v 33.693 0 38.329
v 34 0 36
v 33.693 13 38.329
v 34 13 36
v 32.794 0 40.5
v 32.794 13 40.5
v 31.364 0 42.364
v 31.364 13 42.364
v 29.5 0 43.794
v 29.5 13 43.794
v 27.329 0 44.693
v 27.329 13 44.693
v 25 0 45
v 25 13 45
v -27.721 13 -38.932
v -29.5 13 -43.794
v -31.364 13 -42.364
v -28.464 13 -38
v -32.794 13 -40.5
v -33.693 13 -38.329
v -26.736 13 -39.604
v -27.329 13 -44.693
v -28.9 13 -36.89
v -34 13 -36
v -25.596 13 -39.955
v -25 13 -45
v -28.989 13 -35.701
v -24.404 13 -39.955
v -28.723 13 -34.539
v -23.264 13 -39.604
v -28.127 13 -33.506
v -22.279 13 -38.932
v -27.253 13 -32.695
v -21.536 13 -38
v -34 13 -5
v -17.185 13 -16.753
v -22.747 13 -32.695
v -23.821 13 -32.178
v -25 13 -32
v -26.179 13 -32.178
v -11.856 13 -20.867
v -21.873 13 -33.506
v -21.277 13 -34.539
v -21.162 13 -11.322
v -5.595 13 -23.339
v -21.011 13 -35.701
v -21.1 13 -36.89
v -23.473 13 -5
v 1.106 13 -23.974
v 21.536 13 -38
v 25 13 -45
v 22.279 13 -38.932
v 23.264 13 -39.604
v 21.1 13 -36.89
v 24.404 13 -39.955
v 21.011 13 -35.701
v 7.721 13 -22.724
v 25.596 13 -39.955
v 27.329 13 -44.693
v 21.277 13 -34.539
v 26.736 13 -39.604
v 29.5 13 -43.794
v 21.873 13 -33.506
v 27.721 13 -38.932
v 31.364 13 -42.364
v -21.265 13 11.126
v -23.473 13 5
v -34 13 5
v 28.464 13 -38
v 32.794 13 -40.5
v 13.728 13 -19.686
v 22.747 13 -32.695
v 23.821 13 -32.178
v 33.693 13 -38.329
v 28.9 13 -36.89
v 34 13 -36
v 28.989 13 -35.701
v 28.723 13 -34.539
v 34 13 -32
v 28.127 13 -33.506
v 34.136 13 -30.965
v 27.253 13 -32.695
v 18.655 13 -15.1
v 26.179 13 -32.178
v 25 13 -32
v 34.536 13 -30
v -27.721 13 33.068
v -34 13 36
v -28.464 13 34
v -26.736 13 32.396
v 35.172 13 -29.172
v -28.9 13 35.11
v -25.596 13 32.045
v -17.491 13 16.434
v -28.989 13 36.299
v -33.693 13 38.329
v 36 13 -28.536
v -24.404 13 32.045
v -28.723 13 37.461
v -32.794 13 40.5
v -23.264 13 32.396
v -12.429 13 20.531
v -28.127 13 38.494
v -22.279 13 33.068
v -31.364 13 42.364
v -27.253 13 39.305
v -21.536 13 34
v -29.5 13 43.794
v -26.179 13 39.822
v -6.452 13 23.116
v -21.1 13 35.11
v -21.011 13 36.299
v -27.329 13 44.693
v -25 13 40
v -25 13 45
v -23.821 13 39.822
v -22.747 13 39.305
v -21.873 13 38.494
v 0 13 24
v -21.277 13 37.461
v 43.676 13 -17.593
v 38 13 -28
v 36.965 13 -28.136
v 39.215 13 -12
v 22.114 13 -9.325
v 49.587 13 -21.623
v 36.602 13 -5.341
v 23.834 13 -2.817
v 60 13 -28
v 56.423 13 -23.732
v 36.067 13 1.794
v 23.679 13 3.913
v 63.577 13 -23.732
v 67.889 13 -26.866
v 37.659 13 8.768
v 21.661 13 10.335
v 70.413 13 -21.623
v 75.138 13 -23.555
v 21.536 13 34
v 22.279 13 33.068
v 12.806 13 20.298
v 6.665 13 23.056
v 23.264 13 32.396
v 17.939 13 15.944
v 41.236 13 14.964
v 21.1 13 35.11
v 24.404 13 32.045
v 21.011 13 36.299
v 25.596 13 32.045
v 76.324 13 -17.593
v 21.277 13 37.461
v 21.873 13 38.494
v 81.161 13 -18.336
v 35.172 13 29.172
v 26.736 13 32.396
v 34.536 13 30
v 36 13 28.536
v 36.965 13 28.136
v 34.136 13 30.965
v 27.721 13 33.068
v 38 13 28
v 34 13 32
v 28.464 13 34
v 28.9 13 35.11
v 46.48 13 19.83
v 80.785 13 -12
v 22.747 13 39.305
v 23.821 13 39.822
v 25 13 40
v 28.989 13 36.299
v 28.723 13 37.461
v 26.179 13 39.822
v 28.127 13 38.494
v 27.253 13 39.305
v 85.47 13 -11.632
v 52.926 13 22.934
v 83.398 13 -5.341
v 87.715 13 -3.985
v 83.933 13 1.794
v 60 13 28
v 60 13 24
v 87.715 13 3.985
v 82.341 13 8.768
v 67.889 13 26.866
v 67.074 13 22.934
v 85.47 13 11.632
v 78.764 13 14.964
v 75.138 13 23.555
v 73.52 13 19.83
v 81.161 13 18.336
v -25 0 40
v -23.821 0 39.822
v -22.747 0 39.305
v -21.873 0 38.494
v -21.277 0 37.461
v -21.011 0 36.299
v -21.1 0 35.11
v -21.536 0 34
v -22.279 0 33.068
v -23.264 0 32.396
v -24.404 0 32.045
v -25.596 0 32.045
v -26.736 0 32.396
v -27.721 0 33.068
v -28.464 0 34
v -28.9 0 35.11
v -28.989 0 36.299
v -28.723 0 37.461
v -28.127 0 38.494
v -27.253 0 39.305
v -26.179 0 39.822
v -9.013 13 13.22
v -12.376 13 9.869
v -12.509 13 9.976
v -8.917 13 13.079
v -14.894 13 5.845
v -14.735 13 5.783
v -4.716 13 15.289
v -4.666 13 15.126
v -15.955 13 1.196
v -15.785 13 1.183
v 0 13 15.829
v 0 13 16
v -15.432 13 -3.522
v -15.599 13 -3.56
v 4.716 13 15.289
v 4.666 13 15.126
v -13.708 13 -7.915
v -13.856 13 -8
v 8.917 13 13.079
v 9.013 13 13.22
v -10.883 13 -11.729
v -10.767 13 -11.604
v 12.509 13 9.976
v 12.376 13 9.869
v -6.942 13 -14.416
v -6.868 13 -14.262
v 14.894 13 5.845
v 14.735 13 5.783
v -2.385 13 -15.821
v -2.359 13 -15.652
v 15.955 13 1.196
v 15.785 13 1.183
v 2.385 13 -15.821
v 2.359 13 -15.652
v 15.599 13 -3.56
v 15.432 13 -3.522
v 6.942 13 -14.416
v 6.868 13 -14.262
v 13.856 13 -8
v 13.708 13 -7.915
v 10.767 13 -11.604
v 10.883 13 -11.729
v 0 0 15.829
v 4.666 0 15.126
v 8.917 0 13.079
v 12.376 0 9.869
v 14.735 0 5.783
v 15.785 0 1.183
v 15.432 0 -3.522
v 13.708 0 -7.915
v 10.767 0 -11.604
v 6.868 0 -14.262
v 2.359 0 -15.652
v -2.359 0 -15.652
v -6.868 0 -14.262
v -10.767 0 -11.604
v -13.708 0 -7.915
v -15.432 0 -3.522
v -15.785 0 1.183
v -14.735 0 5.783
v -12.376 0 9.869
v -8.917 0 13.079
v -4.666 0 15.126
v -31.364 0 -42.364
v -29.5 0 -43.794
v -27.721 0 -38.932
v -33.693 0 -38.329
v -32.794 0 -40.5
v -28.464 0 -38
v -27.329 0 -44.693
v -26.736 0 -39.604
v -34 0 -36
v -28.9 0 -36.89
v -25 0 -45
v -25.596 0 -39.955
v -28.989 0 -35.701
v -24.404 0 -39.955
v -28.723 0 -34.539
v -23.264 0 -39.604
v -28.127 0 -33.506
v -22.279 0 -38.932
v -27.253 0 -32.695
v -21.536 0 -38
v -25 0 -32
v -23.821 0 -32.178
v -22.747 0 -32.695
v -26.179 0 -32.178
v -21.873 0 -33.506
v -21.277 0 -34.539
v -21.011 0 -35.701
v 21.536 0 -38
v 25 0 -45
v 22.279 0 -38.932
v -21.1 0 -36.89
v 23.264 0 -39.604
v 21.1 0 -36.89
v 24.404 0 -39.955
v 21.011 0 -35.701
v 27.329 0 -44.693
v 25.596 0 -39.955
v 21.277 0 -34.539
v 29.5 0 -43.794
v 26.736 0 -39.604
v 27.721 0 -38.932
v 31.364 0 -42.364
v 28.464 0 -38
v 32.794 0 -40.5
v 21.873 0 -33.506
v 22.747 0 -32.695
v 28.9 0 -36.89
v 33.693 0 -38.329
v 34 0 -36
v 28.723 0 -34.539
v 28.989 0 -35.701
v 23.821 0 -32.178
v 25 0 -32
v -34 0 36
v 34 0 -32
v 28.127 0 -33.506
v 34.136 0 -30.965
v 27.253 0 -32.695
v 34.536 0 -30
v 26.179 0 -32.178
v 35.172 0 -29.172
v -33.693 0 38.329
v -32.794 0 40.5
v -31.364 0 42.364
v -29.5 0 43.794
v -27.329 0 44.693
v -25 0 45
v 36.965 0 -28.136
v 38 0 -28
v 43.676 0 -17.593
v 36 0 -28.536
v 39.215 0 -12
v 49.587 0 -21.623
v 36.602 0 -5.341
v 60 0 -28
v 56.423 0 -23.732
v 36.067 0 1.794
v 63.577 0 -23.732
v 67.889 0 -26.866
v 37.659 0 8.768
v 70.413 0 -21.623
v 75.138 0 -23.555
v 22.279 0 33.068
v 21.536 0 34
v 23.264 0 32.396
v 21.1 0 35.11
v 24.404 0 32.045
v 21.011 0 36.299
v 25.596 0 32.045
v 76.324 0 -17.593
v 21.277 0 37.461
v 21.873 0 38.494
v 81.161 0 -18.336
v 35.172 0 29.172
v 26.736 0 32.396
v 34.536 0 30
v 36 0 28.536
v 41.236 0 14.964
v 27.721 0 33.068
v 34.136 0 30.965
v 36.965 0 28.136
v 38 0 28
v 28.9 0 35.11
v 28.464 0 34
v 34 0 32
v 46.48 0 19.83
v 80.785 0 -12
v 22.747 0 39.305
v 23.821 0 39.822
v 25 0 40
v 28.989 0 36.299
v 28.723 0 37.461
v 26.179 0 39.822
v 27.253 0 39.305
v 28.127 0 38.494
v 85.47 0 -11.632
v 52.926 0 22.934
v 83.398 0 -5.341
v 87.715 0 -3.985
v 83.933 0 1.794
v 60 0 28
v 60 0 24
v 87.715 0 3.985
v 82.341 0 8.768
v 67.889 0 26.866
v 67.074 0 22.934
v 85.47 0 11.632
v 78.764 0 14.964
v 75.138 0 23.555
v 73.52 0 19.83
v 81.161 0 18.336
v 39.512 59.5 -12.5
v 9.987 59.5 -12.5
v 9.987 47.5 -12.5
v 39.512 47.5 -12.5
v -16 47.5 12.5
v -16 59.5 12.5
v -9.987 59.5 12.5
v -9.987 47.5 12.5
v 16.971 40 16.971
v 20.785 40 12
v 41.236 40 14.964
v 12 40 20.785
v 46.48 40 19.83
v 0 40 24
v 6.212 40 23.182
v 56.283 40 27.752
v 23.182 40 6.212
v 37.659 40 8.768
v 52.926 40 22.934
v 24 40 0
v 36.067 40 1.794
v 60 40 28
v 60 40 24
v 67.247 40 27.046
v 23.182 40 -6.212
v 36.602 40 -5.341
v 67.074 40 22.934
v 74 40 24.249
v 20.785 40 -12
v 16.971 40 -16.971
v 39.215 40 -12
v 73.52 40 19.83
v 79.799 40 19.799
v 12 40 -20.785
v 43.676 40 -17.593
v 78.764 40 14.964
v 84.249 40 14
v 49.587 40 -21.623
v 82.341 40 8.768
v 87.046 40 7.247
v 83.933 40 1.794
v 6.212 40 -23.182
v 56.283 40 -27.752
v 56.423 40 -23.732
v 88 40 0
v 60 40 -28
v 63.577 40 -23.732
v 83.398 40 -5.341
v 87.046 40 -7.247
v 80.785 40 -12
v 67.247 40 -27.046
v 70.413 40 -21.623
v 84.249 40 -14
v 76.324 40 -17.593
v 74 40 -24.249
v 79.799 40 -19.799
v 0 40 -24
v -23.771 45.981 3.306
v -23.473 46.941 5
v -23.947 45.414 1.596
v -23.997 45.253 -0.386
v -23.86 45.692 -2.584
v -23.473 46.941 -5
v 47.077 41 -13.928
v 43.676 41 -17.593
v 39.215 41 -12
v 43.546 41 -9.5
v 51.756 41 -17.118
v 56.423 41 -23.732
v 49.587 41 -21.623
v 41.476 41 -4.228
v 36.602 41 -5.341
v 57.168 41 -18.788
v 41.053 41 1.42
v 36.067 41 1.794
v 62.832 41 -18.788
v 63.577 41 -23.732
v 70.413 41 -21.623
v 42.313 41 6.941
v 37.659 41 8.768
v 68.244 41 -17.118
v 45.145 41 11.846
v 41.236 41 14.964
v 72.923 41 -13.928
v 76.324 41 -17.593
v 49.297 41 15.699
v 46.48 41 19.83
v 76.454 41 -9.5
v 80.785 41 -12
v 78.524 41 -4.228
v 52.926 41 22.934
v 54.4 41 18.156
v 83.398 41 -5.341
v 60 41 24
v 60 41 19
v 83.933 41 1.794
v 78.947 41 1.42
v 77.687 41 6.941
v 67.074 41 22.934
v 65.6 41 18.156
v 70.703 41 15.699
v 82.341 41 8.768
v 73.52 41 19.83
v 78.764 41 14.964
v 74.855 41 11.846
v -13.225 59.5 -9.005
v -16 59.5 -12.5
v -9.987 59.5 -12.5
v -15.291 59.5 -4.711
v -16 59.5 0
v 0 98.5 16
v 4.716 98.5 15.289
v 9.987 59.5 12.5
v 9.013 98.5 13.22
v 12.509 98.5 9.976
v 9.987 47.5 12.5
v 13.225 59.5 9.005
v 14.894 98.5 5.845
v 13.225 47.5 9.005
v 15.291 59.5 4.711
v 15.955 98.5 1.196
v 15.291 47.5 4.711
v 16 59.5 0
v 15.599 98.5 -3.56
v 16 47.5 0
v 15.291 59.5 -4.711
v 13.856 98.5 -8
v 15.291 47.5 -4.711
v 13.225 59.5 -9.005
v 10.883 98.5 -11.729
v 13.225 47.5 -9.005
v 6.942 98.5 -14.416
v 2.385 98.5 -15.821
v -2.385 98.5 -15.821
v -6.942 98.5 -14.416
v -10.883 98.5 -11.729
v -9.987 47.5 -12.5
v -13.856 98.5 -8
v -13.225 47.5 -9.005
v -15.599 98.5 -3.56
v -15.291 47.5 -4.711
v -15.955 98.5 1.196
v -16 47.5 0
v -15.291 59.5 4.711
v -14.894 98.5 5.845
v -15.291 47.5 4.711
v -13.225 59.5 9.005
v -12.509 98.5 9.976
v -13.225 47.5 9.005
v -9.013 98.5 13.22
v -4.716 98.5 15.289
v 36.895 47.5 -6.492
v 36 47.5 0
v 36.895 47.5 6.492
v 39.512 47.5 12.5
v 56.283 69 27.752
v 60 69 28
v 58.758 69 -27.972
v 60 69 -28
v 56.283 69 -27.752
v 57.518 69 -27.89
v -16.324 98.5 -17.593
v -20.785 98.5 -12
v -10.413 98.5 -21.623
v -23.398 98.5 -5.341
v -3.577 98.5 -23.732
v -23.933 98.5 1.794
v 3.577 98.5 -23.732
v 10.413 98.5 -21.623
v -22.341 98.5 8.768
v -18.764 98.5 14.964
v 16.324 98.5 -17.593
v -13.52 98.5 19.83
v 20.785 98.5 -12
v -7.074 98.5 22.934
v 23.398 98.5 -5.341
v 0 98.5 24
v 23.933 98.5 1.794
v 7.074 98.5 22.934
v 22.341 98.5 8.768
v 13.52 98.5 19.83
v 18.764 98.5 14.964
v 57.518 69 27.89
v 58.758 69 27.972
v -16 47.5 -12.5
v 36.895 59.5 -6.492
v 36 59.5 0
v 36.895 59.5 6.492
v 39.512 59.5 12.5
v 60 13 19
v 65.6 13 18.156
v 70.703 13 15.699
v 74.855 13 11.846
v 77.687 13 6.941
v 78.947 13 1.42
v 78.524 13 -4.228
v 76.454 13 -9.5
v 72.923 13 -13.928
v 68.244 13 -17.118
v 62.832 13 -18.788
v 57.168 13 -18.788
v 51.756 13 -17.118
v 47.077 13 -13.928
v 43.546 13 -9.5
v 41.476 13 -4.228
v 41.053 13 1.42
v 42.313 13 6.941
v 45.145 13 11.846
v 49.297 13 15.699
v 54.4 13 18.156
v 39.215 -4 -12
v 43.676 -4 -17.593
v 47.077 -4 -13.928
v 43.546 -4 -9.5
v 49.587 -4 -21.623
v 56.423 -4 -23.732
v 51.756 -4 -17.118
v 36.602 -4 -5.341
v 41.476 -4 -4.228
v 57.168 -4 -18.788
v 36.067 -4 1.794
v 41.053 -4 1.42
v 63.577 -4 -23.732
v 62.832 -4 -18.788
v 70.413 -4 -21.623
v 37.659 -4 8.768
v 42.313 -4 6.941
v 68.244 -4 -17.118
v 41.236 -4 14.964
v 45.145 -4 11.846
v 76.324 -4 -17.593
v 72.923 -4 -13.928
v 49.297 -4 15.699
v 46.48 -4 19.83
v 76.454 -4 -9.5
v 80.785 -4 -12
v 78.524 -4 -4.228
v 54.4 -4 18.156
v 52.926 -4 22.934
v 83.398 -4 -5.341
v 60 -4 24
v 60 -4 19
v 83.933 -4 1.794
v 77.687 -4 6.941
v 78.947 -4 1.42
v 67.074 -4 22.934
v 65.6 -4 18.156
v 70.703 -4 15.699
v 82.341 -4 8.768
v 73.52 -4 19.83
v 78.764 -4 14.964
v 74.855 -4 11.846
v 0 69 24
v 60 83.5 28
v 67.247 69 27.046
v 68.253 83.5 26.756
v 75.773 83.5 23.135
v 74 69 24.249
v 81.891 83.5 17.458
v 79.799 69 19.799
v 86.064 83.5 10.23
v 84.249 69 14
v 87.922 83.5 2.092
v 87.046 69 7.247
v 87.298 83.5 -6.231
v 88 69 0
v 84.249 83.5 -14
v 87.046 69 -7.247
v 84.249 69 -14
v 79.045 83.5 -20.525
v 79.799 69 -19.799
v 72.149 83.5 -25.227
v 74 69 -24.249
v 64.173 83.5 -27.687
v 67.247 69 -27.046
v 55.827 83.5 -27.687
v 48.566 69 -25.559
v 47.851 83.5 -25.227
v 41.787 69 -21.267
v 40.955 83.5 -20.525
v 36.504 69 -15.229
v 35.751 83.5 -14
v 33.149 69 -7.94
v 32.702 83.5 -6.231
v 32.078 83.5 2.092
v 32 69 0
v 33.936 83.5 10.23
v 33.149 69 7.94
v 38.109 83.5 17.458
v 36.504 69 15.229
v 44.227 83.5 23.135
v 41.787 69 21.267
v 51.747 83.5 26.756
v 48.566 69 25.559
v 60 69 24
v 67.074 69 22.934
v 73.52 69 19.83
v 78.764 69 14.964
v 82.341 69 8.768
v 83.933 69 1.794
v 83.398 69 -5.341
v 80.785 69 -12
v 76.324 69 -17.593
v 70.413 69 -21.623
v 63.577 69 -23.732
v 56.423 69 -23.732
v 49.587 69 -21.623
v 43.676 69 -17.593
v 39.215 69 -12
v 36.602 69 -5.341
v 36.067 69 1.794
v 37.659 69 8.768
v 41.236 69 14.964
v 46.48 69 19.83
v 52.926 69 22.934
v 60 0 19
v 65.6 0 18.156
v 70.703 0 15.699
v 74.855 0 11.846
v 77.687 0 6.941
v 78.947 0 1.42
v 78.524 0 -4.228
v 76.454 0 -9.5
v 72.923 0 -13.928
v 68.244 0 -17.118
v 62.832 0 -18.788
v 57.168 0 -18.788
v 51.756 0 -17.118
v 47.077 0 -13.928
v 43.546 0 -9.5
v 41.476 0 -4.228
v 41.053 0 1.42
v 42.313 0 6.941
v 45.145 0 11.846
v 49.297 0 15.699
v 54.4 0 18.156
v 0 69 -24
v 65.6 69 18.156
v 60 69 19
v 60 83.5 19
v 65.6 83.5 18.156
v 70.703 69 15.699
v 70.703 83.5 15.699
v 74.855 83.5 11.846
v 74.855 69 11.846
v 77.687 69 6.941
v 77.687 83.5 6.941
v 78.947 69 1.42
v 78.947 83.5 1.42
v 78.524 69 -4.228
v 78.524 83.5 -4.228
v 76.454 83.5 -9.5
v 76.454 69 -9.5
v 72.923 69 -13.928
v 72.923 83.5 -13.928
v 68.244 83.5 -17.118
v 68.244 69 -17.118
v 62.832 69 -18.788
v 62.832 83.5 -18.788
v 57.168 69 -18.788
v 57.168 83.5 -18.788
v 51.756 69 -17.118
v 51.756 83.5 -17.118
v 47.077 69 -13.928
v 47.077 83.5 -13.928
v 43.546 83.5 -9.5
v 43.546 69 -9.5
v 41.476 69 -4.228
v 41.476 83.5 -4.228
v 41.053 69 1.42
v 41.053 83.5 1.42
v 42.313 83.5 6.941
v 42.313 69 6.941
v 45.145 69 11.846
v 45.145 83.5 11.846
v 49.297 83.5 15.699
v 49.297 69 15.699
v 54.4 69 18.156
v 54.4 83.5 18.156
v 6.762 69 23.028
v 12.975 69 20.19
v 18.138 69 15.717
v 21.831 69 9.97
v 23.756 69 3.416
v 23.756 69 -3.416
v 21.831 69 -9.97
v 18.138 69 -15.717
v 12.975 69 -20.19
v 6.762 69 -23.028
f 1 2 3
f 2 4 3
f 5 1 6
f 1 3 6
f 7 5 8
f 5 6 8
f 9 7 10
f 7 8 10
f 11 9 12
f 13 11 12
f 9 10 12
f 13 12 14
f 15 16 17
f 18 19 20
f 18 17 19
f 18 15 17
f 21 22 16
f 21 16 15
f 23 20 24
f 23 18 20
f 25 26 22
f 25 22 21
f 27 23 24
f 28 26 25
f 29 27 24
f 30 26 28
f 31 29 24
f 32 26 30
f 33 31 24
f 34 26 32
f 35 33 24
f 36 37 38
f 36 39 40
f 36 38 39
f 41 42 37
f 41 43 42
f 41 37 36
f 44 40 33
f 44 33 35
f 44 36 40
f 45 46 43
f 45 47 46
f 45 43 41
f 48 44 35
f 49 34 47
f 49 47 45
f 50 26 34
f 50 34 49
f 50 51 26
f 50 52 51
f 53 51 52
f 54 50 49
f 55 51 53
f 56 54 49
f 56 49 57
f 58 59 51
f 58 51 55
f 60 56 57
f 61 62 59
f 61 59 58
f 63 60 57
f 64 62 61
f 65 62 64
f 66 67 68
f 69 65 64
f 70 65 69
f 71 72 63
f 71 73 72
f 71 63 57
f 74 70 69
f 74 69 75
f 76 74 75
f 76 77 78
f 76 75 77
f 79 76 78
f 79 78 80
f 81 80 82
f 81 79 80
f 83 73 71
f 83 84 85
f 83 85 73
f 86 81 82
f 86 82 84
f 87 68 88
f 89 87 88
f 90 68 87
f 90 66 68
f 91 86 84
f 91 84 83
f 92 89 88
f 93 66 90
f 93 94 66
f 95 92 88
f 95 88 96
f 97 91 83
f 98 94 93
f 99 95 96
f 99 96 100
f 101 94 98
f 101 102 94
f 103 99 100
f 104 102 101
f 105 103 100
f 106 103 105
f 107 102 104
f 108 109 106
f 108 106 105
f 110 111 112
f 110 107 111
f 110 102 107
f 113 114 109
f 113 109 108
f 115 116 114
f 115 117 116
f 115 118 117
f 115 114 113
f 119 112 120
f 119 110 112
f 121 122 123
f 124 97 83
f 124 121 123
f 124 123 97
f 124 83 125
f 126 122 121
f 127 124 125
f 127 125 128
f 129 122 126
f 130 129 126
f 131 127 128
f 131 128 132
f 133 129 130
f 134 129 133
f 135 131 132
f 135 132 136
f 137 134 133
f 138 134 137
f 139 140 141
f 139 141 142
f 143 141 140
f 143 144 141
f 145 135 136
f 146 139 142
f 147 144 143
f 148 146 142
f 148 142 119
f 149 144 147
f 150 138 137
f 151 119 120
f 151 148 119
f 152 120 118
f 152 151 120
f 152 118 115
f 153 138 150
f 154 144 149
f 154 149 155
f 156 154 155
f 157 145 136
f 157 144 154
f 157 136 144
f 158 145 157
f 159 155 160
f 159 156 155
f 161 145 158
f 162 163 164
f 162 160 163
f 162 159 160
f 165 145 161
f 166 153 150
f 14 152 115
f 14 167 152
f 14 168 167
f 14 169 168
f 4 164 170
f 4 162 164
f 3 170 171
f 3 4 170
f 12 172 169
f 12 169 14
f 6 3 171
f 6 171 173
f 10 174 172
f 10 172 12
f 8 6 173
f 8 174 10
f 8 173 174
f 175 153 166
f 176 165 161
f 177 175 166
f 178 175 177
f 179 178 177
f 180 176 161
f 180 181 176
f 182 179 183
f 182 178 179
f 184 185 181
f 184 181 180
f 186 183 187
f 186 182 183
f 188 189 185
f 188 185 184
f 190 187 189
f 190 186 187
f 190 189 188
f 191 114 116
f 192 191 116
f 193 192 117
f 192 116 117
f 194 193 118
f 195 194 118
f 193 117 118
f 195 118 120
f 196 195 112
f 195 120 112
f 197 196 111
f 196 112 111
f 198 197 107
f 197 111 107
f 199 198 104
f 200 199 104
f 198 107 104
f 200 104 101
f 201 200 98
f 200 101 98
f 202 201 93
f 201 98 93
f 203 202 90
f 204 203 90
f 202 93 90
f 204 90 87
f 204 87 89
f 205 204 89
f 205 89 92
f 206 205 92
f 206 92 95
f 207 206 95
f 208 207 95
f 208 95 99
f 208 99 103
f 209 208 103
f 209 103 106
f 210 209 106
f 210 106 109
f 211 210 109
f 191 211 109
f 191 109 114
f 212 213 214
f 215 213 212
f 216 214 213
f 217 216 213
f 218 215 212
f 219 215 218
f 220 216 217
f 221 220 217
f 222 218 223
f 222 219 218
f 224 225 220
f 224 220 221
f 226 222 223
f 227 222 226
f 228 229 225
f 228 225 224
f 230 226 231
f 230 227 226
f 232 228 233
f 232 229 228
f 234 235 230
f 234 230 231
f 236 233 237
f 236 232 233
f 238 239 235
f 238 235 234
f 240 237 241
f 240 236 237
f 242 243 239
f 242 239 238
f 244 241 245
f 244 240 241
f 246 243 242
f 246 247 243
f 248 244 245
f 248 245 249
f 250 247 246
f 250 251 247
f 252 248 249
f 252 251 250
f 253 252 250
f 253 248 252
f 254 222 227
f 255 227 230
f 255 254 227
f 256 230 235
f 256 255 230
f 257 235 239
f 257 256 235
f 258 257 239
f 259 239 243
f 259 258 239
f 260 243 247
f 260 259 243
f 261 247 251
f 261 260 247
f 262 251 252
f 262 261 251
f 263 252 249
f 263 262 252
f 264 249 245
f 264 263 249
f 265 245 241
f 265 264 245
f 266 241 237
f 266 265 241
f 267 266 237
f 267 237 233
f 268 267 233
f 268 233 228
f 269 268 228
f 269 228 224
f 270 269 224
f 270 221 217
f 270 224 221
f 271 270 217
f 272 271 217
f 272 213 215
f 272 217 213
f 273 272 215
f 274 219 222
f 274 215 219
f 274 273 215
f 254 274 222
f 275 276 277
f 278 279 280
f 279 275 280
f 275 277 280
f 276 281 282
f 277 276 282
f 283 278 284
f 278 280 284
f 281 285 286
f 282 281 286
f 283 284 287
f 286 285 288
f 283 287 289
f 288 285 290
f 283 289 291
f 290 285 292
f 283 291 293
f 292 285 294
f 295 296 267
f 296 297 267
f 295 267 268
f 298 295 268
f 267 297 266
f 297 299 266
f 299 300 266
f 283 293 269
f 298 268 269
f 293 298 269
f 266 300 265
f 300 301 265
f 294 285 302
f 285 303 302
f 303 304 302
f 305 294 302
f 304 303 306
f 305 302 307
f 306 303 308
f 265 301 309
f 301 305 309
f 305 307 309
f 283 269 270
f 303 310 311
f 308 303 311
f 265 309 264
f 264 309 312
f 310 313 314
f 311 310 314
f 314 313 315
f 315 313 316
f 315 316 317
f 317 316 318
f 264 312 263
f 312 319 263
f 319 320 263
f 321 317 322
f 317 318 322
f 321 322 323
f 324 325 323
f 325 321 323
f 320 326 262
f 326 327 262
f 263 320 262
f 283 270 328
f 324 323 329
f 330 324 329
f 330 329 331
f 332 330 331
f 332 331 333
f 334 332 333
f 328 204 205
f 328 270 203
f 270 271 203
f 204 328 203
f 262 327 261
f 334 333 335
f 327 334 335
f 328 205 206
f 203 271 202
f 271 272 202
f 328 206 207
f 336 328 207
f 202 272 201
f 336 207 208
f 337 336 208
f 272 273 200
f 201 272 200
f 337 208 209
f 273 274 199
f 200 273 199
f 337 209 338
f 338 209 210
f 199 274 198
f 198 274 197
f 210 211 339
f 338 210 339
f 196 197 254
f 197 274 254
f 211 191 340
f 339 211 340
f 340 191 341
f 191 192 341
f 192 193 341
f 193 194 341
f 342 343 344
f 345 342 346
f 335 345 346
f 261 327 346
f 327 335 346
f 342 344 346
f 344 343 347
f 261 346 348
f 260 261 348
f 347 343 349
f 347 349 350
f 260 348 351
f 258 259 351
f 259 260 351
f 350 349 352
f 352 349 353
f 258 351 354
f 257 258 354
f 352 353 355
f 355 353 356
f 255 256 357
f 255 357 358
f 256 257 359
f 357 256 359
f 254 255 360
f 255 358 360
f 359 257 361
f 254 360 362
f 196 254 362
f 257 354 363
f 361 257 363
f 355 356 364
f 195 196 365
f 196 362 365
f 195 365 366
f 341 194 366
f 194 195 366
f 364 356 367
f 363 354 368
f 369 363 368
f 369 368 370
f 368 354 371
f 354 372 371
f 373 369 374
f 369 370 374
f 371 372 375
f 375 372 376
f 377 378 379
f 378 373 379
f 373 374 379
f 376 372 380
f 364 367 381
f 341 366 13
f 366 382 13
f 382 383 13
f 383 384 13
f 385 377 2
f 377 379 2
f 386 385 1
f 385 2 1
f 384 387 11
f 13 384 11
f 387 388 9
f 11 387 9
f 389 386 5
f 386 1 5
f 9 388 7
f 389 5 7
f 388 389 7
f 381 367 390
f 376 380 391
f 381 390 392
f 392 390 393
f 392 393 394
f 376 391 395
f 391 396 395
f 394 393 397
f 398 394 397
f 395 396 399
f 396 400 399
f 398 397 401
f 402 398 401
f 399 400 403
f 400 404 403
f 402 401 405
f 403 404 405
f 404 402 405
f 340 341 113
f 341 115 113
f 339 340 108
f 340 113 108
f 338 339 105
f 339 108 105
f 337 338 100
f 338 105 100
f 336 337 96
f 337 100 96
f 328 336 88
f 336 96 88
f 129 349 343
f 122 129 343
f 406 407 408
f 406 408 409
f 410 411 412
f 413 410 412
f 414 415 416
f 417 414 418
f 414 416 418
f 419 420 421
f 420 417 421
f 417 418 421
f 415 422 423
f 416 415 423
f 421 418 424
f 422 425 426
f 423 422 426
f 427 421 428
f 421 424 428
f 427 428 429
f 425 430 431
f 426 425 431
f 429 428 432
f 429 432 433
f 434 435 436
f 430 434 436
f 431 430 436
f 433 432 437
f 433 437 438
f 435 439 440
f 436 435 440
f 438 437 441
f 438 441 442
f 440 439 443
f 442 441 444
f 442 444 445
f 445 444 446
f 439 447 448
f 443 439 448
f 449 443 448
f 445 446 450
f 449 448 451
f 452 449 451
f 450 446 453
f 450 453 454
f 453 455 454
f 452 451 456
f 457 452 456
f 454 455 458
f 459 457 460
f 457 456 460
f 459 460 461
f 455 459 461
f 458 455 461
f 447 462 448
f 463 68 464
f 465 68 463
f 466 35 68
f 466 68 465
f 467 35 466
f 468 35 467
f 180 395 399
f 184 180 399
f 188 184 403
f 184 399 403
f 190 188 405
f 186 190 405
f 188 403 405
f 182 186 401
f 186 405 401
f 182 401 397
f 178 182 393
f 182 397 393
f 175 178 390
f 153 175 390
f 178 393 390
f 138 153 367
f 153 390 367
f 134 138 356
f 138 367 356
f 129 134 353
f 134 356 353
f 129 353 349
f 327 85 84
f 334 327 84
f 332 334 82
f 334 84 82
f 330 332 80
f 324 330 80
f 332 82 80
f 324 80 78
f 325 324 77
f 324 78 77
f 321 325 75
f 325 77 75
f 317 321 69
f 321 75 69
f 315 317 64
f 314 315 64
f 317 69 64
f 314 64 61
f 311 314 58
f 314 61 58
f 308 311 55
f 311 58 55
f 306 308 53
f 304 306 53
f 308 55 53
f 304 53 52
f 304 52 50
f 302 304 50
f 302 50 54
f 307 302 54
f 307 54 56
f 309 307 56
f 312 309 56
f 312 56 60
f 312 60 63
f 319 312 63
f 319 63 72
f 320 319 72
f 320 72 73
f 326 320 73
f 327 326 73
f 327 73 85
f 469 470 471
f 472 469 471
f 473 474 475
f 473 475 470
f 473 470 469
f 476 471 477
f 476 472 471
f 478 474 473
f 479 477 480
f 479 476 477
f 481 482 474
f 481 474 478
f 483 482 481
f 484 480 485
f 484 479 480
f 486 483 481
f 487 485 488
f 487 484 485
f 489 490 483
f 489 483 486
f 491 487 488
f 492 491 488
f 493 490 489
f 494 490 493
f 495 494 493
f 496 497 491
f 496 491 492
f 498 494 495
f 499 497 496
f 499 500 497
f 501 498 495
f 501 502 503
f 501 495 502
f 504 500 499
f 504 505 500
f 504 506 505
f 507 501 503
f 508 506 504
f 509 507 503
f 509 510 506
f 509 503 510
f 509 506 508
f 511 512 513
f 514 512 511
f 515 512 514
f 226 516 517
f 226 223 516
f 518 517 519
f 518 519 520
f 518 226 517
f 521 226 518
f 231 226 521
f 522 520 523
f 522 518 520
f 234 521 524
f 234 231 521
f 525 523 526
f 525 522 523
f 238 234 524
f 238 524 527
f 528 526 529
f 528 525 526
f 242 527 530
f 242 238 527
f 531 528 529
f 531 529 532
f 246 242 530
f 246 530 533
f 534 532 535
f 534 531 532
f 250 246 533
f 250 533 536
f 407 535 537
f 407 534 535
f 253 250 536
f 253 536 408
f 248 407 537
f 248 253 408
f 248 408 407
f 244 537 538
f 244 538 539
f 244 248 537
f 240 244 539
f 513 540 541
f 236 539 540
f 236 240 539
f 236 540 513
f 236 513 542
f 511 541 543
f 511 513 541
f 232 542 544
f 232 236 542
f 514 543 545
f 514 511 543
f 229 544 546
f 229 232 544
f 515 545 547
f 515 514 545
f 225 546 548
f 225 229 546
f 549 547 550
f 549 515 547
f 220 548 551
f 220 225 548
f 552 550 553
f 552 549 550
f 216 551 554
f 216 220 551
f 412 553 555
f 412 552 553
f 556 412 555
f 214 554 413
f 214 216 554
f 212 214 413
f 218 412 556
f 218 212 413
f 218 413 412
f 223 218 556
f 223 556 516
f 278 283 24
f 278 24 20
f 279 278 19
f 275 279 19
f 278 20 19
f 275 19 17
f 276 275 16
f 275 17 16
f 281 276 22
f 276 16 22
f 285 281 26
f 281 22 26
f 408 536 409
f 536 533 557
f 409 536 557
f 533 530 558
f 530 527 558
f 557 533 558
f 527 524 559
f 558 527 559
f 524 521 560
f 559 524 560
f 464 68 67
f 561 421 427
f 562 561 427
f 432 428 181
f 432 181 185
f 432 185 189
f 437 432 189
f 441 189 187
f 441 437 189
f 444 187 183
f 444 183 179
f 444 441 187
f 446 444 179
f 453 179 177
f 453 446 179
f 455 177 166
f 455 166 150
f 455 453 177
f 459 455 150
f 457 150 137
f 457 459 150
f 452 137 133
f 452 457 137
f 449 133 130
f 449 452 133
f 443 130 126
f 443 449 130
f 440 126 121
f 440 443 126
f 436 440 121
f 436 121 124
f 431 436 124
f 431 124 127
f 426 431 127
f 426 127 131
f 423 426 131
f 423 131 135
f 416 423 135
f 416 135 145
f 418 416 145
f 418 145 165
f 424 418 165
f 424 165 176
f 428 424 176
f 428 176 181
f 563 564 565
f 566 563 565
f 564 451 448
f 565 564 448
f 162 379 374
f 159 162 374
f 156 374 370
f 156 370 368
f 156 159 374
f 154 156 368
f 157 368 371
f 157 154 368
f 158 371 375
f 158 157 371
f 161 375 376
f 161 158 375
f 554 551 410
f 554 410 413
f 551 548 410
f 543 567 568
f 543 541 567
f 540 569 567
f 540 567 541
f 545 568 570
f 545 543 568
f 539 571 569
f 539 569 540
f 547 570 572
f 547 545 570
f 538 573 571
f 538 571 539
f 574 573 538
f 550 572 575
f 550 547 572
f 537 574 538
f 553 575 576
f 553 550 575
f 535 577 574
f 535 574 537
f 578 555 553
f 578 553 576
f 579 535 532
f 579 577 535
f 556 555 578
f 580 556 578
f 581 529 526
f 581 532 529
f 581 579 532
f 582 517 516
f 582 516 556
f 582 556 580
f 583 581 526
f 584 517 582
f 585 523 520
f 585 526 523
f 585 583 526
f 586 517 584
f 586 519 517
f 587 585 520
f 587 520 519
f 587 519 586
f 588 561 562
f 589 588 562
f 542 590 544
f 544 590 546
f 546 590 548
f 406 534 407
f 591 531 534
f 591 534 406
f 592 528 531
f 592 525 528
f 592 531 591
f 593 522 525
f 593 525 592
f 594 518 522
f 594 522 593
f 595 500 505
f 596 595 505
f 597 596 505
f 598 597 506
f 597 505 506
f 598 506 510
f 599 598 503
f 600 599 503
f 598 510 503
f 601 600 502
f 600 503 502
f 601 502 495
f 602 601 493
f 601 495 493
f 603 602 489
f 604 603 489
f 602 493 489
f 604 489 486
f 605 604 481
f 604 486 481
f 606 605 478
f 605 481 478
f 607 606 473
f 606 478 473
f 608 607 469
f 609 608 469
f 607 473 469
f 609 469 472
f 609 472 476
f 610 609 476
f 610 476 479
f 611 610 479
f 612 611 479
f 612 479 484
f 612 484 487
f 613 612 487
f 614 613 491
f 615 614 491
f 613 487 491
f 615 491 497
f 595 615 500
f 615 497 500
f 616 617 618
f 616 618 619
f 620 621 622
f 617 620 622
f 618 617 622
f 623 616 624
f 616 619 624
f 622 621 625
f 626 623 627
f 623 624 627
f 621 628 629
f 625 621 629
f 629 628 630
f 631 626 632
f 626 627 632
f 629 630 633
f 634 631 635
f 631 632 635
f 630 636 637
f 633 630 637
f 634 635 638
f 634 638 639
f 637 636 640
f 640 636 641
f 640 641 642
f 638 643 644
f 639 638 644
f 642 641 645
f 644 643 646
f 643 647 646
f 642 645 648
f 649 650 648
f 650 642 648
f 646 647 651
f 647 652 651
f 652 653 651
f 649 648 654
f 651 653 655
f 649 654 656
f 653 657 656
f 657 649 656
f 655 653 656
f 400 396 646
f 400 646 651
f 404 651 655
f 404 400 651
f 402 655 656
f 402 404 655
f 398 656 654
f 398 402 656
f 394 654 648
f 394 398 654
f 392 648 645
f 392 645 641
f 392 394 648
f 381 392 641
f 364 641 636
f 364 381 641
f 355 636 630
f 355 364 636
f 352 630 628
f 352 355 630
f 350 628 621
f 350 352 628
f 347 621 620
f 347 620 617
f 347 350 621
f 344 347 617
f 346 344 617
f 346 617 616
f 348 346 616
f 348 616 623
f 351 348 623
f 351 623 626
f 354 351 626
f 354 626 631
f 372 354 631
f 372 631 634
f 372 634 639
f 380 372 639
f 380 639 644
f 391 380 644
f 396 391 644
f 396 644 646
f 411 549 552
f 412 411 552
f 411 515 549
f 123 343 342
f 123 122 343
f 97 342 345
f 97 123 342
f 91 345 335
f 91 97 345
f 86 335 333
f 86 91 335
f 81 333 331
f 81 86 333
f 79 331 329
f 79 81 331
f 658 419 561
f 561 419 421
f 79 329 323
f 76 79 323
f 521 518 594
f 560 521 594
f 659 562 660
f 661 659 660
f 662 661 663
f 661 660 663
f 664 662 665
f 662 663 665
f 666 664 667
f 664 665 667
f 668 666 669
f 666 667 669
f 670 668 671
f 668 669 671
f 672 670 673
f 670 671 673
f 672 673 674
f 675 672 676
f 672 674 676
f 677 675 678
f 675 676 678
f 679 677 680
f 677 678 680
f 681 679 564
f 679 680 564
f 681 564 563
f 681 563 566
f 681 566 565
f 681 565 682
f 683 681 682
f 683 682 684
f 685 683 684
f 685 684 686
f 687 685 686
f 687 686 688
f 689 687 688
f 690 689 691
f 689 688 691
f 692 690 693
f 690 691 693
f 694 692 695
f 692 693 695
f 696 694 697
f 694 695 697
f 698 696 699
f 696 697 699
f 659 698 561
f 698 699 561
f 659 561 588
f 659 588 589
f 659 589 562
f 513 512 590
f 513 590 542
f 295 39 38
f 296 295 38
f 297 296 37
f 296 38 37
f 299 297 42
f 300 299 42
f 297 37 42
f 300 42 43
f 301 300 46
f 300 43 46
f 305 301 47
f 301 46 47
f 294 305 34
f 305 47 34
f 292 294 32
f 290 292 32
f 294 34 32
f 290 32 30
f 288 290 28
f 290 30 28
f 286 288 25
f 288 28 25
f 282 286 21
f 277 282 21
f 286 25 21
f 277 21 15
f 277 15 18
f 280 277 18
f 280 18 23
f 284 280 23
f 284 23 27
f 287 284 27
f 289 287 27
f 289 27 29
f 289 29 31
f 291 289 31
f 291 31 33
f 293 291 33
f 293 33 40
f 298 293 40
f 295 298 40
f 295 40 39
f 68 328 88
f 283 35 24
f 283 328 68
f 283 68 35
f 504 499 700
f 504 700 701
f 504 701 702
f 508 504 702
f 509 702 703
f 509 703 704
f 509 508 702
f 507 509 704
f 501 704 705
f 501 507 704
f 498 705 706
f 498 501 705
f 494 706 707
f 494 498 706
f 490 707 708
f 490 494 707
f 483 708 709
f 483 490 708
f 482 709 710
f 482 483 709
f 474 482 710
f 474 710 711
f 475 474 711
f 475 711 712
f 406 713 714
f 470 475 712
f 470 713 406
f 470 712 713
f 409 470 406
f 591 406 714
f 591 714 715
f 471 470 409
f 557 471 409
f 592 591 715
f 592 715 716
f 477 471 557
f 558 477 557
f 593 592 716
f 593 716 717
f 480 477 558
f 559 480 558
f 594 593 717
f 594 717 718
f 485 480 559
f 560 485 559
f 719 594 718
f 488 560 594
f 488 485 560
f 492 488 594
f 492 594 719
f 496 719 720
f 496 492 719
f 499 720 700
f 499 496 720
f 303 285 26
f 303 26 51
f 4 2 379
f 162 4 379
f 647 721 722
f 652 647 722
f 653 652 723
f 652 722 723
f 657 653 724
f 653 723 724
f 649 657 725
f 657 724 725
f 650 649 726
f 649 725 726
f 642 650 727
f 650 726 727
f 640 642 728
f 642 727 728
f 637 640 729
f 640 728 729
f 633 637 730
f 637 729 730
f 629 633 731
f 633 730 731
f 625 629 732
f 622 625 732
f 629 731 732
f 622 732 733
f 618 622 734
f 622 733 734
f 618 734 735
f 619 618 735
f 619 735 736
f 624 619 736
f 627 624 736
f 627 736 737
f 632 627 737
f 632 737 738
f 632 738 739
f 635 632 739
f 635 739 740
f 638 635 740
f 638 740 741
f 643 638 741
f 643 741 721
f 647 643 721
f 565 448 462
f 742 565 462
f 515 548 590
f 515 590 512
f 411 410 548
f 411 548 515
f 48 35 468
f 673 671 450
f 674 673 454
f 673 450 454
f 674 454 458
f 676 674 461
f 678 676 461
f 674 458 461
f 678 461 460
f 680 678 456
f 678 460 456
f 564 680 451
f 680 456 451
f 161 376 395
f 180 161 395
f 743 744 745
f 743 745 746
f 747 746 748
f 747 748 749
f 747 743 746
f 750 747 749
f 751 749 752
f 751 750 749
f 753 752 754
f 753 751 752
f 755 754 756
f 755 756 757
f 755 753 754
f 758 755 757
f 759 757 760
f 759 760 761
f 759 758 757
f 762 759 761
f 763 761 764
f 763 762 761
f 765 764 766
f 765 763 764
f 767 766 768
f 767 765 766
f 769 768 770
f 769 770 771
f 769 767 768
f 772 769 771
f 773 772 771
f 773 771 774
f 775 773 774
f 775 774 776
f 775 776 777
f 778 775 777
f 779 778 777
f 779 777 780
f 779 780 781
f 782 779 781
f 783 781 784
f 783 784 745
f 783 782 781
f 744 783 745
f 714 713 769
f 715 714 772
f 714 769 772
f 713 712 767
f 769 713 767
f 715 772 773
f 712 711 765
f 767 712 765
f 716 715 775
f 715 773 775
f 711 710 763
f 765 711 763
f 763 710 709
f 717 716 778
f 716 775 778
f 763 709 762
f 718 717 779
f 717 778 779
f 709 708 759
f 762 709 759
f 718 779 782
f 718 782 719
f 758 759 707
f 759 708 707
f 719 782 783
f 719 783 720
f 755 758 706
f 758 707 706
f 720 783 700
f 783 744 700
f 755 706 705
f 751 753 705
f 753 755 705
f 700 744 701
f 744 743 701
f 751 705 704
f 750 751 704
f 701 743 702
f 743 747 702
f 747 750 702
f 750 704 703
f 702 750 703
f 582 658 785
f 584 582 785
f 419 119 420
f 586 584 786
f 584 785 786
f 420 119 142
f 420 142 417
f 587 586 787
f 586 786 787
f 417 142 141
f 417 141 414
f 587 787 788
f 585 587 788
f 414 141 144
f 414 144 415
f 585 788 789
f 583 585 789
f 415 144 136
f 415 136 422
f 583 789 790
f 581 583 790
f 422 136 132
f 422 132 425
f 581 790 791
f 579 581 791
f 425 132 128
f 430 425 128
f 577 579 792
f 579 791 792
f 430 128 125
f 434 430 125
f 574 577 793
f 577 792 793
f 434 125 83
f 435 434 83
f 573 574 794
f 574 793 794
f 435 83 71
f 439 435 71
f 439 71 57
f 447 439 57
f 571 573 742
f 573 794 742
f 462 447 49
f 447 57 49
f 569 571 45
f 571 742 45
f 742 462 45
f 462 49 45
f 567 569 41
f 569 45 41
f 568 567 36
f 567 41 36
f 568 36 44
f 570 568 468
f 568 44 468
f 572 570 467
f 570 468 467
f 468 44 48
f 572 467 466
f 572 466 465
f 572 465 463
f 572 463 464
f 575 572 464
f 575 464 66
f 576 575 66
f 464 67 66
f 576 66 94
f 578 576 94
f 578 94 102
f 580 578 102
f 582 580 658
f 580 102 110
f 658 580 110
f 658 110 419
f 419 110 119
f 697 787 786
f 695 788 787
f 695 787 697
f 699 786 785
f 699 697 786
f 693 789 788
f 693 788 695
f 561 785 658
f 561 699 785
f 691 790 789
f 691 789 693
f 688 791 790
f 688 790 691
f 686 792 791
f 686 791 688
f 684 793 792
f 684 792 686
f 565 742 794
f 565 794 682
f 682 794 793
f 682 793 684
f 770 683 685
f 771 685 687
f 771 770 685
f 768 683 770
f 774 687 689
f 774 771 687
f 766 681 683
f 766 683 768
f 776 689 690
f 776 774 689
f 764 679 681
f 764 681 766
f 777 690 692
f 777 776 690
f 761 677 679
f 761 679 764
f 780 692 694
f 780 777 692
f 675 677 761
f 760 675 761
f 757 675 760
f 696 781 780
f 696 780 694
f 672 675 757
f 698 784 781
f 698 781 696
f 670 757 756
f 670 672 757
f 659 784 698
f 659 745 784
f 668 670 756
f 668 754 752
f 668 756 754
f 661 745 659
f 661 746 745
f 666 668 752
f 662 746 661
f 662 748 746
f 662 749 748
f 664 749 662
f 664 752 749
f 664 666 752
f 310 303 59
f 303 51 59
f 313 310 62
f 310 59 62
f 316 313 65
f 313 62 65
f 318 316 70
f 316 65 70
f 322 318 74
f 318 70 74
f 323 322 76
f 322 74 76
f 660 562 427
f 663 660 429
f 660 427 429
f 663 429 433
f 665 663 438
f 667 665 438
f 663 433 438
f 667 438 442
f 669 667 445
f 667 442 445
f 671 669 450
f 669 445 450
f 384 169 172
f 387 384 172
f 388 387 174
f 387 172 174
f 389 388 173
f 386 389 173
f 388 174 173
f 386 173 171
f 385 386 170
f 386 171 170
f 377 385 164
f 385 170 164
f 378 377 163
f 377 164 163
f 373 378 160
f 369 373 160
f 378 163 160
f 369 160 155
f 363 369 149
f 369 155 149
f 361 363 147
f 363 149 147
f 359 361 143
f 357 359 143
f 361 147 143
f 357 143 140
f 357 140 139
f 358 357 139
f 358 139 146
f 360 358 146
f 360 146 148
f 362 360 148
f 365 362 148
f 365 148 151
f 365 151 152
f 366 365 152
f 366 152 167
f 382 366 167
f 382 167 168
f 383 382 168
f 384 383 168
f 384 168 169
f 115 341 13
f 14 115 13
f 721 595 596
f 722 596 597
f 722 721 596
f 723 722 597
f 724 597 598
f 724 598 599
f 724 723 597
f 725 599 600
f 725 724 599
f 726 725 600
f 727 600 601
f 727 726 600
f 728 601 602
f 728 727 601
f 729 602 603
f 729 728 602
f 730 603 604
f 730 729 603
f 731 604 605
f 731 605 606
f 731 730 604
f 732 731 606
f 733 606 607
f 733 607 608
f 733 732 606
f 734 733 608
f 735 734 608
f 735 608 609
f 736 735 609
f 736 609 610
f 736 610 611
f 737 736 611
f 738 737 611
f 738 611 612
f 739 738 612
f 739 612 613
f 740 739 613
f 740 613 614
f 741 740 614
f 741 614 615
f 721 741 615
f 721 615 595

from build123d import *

# Parameters (mm, degrees)
BOSS_EXTRUDE1_DEPTH       = 13
FILLET2_R                 = 4
FILLET3_R                 = 9
SKETCH5_R                 = 4
CUT_EXTRUDE1_DEPTH        = 100.689518005
SKETCH6_R                 = 24
SKETCH6_R_2               = 16
BOSS_EXTRUDE2_DEPTH       = 41.064418341
SKETCH7_R                 = 24
SKETCH7_R_2               = 19
BOSS_EXTRUDE3_DEPTH       = 17
BOSS_EXTRUDE4_START       = 28
SKETCH7_2_R               = 24
SKETCH7_2_R_2             = 19
BOSS_EXTRUDE4_DEPTH       = 28
BOSS_EXTRUDE11_DEPTH      = 28
BOSS_EXTRUDE11_DEPTH_BACK = 1
SKETCH8_R                 = 24
SKETCH8_R_2               = 16
SKETCH9_W                 = 95
SKETCH9_H                 = 12
CUT_EXTRUDE2_DEPTH        = 12.5
SKETCH10_R                = 24
SKETCH10_R_2              = 16
BOSS_EXTRUDE12_DEPTH      = 29.5
SKETCH12_R                = 28
SKETCH12_R_2              = 19
BOSS_EXTRUDE13_DEPTH      = 14.5
RIB1_REACH                = 141.539
SKETCH13_WALL_W           = 318.21240823
SKETCH13_WALL_H           = 10
SKETCH15_R                = 15.829166104
SKETCH15_R_2              = 19
CUT_EXTRUDE5_DEPTH        = 140.539420953


with BuildPart() as part:
    # Sketch3 → Boss-Extrude1 (new body)
    with BuildSketch(Plane(origin=(0, 0, 0), x_dir=(1, 0, 0), z_dir=(0, 1, 0))):
        with BuildLine():
            Line((34, -45), (34, -28))
            Line((34, -28), (60, -28))
            ThreePointArc((60, -28), (88, 0), (60, 28))
            Line((60, 28), (34, 28))
            Line((34, 28), (34, 45))
            Line((34, 45), (-34, 45))
            Line((-34, 45), (-34, -45))
            Line((-34, -45), (34, -45))
        make_face()
    extrude(amount=BOSS_EXTRUDE1_DEPTH)

    # Fillet2
    fillet2_edges = [part.edges().sort_by_distance(p)[0] for p in [
        (34, 6.5, -28),
        (34, 6.5, 28),
    ]]
    fillet(fillet2_edges, radius=FILLET2_R)

    # Fillet3
    fillet3_edges = [part.edges().sort_by_distance(p)[0] for p in [
        (-34, 6.5, 45),
        (34, 6.5, 45),
        (34, 6.5, -45),
        (-34, 6.5, -45),
    ]]
    fillet(fillet3_edges, radius=FILLET3_R)

    # Sketch5 → Cut-Extrude1 (cut, through all)
    with BuildSketch(Plane(origin=(0, 13, 0), x_dir=(1, 0, 0), z_dir=(0, 1, 0))):
        with Locations((-25, 36)):
            Circle(SKETCH5_R)
        with Locations((25, 36)):
            Circle(SKETCH5_R)
        with Locations((-25, -36)):
            Circle(SKETCH5_R)
        with Locations((25, -36)):
            Circle(SKETCH5_R)
    extrude(amount=-CUT_EXTRUDE1_DEPTH, mode=Mode.SUBTRACT)

    # Sketch6 → Boss-Extrude2 (add)
    with BuildSketch(Plane(origin=(0, 0, 0), x_dir=(1, 0, 0), z_dir=(0, 1, 0))):
        Circle(SKETCH6_R)
        Circle(SKETCH6_R_2, mode=Mode.SUBTRACT)
    extrude(amount=BOSS_EXTRUDE2_DEPTH)

    # Sketch7 → Boss-Extrude3 (add)
    with BuildSketch(Plane(origin=(0, 13, 0), x_dir=(1, 0, 0), z_dir=(0, 1, 0))):
        with Locations((60, 0)):
            Circle(SKETCH7_R)
        with Locations((60, 0)):
            Circle(SKETCH7_R_2, mode=Mode.SUBTRACT)
    extrude(amount=-BOSS_EXTRUDE3_DEPTH)

    # Sketch7<2> → Boss-Extrude4 (add)
    with BuildSketch(Plane(origin=(0, 13, 0), x_dir=(1, 0, 0), z_dir=(0, 1, 0)).offset(BOSS_EXTRUDE4_START)):
        with Locations((60, 0)):
            Circle(SKETCH7_2_R)
        with Locations((60, 0)):
            Circle(SKETCH7_2_R_2, mode=Mode.SUBTRACT)
    extrude(amount=-BOSS_EXTRUDE4_DEPTH)

    # Sketch8 → Boss-Extrude11 (add, two sides: drawn at the far end of the back side and taken through both)
    with BuildSketch(Plane(origin=(0, 41, 0), x_dir=(1, 0, 0), z_dir=(0, 1, 0)).offset(-BOSS_EXTRUDE11_DEPTH_BACK)):
        with BuildLine():
            ThreePointArc((0, 24), (-24, 0), (0, -24))
            Line((0, -24), (60, -28))
            ThreePointArc((60, -28), (88, 0), (60, 28))
            Line((60, 28), (0, 24))
        make_face()
        with Locations((60, 0)):
            Circle(SKETCH8_R, mode=Mode.SUBTRACT)
        Circle(SKETCH8_R_2, mode=Mode.SUBTRACT)
    extrude(amount=BOSS_EXTRUDE11_DEPTH + BOSS_EXTRUDE11_DEPTH_BACK)

    # Sketch9 → Cut-Extrude2 (cut, symmetric)
    with BuildSketch(Plane.XY):
        with Locations((31.5, 53.5)):
            Rectangle(SKETCH9_W, SKETCH9_H)
    extrude(amount=CUT_EXTRUDE2_DEPTH, both=True, mode=Mode.SUBTRACT)

    # Sketch10 → Boss-Extrude12 (add)
    with BuildSketch(Plane(origin=(0, 69, 0), x_dir=(1, 0, 0), z_dir=(0, 1, 0))):
        Circle(SKETCH10_R)
        Circle(SKETCH10_R_2, mode=Mode.SUBTRACT)
    extrude(amount=BOSS_EXTRUDE12_DEPTH)

    # Sketch12 → Boss-Extrude13 (add)
    with BuildSketch(Plane(origin=(0, 69, 0), x_dir=(1, 0, 0), z_dir=(0, 1, 0))):
        with Locations((60, 0)):
            Circle(SKETCH12_R)
        with Locations((60, 0)):
            Circle(SKETCH12_R_2, mode=Mode.SUBTRACT)
    extrude(amount=BOSS_EXTRUDE13_DEPTH)

    # Sketch13 wall → Rib1 (add, up to next)
    with BuildSketch(Plane(origin=(-28.5, 30.733455303, 0), x_dir=(0.296227943859, 0.955117273049, 0), z_dir=(-0.955117273049, 0.296227943859, 0)), mode=Mode.PRIVATE) as rib1_sk1:
        Rectangle(SKETCH13_WALL_W, SKETCH13_WALL_H)
    rib1_tool1 = extrude(rib1_sk1.sketch, amount=-RIB1_REACH, mode=Mode.PRIVATE) - part.part
    add(rib1_tool1.solids().sort_by_distance((-28.5, 30.733455303, 0))[0])

    # Sketch15 → Cut-Extrude5 (cut, through all)
    with BuildSketch(Plane(origin=(0, 0, 0), x_dir=(1, 0, 0), z_dir=(0, 1, 0))):
        Circle(SKETCH15_R)
        with Locations((60, 0)):
            Circle(SKETCH15_R_2)
    extrude(amount=CUT_EXTRUDE5_DEPTH, mode=Mode.SUBTRACT)


solid = part.part
